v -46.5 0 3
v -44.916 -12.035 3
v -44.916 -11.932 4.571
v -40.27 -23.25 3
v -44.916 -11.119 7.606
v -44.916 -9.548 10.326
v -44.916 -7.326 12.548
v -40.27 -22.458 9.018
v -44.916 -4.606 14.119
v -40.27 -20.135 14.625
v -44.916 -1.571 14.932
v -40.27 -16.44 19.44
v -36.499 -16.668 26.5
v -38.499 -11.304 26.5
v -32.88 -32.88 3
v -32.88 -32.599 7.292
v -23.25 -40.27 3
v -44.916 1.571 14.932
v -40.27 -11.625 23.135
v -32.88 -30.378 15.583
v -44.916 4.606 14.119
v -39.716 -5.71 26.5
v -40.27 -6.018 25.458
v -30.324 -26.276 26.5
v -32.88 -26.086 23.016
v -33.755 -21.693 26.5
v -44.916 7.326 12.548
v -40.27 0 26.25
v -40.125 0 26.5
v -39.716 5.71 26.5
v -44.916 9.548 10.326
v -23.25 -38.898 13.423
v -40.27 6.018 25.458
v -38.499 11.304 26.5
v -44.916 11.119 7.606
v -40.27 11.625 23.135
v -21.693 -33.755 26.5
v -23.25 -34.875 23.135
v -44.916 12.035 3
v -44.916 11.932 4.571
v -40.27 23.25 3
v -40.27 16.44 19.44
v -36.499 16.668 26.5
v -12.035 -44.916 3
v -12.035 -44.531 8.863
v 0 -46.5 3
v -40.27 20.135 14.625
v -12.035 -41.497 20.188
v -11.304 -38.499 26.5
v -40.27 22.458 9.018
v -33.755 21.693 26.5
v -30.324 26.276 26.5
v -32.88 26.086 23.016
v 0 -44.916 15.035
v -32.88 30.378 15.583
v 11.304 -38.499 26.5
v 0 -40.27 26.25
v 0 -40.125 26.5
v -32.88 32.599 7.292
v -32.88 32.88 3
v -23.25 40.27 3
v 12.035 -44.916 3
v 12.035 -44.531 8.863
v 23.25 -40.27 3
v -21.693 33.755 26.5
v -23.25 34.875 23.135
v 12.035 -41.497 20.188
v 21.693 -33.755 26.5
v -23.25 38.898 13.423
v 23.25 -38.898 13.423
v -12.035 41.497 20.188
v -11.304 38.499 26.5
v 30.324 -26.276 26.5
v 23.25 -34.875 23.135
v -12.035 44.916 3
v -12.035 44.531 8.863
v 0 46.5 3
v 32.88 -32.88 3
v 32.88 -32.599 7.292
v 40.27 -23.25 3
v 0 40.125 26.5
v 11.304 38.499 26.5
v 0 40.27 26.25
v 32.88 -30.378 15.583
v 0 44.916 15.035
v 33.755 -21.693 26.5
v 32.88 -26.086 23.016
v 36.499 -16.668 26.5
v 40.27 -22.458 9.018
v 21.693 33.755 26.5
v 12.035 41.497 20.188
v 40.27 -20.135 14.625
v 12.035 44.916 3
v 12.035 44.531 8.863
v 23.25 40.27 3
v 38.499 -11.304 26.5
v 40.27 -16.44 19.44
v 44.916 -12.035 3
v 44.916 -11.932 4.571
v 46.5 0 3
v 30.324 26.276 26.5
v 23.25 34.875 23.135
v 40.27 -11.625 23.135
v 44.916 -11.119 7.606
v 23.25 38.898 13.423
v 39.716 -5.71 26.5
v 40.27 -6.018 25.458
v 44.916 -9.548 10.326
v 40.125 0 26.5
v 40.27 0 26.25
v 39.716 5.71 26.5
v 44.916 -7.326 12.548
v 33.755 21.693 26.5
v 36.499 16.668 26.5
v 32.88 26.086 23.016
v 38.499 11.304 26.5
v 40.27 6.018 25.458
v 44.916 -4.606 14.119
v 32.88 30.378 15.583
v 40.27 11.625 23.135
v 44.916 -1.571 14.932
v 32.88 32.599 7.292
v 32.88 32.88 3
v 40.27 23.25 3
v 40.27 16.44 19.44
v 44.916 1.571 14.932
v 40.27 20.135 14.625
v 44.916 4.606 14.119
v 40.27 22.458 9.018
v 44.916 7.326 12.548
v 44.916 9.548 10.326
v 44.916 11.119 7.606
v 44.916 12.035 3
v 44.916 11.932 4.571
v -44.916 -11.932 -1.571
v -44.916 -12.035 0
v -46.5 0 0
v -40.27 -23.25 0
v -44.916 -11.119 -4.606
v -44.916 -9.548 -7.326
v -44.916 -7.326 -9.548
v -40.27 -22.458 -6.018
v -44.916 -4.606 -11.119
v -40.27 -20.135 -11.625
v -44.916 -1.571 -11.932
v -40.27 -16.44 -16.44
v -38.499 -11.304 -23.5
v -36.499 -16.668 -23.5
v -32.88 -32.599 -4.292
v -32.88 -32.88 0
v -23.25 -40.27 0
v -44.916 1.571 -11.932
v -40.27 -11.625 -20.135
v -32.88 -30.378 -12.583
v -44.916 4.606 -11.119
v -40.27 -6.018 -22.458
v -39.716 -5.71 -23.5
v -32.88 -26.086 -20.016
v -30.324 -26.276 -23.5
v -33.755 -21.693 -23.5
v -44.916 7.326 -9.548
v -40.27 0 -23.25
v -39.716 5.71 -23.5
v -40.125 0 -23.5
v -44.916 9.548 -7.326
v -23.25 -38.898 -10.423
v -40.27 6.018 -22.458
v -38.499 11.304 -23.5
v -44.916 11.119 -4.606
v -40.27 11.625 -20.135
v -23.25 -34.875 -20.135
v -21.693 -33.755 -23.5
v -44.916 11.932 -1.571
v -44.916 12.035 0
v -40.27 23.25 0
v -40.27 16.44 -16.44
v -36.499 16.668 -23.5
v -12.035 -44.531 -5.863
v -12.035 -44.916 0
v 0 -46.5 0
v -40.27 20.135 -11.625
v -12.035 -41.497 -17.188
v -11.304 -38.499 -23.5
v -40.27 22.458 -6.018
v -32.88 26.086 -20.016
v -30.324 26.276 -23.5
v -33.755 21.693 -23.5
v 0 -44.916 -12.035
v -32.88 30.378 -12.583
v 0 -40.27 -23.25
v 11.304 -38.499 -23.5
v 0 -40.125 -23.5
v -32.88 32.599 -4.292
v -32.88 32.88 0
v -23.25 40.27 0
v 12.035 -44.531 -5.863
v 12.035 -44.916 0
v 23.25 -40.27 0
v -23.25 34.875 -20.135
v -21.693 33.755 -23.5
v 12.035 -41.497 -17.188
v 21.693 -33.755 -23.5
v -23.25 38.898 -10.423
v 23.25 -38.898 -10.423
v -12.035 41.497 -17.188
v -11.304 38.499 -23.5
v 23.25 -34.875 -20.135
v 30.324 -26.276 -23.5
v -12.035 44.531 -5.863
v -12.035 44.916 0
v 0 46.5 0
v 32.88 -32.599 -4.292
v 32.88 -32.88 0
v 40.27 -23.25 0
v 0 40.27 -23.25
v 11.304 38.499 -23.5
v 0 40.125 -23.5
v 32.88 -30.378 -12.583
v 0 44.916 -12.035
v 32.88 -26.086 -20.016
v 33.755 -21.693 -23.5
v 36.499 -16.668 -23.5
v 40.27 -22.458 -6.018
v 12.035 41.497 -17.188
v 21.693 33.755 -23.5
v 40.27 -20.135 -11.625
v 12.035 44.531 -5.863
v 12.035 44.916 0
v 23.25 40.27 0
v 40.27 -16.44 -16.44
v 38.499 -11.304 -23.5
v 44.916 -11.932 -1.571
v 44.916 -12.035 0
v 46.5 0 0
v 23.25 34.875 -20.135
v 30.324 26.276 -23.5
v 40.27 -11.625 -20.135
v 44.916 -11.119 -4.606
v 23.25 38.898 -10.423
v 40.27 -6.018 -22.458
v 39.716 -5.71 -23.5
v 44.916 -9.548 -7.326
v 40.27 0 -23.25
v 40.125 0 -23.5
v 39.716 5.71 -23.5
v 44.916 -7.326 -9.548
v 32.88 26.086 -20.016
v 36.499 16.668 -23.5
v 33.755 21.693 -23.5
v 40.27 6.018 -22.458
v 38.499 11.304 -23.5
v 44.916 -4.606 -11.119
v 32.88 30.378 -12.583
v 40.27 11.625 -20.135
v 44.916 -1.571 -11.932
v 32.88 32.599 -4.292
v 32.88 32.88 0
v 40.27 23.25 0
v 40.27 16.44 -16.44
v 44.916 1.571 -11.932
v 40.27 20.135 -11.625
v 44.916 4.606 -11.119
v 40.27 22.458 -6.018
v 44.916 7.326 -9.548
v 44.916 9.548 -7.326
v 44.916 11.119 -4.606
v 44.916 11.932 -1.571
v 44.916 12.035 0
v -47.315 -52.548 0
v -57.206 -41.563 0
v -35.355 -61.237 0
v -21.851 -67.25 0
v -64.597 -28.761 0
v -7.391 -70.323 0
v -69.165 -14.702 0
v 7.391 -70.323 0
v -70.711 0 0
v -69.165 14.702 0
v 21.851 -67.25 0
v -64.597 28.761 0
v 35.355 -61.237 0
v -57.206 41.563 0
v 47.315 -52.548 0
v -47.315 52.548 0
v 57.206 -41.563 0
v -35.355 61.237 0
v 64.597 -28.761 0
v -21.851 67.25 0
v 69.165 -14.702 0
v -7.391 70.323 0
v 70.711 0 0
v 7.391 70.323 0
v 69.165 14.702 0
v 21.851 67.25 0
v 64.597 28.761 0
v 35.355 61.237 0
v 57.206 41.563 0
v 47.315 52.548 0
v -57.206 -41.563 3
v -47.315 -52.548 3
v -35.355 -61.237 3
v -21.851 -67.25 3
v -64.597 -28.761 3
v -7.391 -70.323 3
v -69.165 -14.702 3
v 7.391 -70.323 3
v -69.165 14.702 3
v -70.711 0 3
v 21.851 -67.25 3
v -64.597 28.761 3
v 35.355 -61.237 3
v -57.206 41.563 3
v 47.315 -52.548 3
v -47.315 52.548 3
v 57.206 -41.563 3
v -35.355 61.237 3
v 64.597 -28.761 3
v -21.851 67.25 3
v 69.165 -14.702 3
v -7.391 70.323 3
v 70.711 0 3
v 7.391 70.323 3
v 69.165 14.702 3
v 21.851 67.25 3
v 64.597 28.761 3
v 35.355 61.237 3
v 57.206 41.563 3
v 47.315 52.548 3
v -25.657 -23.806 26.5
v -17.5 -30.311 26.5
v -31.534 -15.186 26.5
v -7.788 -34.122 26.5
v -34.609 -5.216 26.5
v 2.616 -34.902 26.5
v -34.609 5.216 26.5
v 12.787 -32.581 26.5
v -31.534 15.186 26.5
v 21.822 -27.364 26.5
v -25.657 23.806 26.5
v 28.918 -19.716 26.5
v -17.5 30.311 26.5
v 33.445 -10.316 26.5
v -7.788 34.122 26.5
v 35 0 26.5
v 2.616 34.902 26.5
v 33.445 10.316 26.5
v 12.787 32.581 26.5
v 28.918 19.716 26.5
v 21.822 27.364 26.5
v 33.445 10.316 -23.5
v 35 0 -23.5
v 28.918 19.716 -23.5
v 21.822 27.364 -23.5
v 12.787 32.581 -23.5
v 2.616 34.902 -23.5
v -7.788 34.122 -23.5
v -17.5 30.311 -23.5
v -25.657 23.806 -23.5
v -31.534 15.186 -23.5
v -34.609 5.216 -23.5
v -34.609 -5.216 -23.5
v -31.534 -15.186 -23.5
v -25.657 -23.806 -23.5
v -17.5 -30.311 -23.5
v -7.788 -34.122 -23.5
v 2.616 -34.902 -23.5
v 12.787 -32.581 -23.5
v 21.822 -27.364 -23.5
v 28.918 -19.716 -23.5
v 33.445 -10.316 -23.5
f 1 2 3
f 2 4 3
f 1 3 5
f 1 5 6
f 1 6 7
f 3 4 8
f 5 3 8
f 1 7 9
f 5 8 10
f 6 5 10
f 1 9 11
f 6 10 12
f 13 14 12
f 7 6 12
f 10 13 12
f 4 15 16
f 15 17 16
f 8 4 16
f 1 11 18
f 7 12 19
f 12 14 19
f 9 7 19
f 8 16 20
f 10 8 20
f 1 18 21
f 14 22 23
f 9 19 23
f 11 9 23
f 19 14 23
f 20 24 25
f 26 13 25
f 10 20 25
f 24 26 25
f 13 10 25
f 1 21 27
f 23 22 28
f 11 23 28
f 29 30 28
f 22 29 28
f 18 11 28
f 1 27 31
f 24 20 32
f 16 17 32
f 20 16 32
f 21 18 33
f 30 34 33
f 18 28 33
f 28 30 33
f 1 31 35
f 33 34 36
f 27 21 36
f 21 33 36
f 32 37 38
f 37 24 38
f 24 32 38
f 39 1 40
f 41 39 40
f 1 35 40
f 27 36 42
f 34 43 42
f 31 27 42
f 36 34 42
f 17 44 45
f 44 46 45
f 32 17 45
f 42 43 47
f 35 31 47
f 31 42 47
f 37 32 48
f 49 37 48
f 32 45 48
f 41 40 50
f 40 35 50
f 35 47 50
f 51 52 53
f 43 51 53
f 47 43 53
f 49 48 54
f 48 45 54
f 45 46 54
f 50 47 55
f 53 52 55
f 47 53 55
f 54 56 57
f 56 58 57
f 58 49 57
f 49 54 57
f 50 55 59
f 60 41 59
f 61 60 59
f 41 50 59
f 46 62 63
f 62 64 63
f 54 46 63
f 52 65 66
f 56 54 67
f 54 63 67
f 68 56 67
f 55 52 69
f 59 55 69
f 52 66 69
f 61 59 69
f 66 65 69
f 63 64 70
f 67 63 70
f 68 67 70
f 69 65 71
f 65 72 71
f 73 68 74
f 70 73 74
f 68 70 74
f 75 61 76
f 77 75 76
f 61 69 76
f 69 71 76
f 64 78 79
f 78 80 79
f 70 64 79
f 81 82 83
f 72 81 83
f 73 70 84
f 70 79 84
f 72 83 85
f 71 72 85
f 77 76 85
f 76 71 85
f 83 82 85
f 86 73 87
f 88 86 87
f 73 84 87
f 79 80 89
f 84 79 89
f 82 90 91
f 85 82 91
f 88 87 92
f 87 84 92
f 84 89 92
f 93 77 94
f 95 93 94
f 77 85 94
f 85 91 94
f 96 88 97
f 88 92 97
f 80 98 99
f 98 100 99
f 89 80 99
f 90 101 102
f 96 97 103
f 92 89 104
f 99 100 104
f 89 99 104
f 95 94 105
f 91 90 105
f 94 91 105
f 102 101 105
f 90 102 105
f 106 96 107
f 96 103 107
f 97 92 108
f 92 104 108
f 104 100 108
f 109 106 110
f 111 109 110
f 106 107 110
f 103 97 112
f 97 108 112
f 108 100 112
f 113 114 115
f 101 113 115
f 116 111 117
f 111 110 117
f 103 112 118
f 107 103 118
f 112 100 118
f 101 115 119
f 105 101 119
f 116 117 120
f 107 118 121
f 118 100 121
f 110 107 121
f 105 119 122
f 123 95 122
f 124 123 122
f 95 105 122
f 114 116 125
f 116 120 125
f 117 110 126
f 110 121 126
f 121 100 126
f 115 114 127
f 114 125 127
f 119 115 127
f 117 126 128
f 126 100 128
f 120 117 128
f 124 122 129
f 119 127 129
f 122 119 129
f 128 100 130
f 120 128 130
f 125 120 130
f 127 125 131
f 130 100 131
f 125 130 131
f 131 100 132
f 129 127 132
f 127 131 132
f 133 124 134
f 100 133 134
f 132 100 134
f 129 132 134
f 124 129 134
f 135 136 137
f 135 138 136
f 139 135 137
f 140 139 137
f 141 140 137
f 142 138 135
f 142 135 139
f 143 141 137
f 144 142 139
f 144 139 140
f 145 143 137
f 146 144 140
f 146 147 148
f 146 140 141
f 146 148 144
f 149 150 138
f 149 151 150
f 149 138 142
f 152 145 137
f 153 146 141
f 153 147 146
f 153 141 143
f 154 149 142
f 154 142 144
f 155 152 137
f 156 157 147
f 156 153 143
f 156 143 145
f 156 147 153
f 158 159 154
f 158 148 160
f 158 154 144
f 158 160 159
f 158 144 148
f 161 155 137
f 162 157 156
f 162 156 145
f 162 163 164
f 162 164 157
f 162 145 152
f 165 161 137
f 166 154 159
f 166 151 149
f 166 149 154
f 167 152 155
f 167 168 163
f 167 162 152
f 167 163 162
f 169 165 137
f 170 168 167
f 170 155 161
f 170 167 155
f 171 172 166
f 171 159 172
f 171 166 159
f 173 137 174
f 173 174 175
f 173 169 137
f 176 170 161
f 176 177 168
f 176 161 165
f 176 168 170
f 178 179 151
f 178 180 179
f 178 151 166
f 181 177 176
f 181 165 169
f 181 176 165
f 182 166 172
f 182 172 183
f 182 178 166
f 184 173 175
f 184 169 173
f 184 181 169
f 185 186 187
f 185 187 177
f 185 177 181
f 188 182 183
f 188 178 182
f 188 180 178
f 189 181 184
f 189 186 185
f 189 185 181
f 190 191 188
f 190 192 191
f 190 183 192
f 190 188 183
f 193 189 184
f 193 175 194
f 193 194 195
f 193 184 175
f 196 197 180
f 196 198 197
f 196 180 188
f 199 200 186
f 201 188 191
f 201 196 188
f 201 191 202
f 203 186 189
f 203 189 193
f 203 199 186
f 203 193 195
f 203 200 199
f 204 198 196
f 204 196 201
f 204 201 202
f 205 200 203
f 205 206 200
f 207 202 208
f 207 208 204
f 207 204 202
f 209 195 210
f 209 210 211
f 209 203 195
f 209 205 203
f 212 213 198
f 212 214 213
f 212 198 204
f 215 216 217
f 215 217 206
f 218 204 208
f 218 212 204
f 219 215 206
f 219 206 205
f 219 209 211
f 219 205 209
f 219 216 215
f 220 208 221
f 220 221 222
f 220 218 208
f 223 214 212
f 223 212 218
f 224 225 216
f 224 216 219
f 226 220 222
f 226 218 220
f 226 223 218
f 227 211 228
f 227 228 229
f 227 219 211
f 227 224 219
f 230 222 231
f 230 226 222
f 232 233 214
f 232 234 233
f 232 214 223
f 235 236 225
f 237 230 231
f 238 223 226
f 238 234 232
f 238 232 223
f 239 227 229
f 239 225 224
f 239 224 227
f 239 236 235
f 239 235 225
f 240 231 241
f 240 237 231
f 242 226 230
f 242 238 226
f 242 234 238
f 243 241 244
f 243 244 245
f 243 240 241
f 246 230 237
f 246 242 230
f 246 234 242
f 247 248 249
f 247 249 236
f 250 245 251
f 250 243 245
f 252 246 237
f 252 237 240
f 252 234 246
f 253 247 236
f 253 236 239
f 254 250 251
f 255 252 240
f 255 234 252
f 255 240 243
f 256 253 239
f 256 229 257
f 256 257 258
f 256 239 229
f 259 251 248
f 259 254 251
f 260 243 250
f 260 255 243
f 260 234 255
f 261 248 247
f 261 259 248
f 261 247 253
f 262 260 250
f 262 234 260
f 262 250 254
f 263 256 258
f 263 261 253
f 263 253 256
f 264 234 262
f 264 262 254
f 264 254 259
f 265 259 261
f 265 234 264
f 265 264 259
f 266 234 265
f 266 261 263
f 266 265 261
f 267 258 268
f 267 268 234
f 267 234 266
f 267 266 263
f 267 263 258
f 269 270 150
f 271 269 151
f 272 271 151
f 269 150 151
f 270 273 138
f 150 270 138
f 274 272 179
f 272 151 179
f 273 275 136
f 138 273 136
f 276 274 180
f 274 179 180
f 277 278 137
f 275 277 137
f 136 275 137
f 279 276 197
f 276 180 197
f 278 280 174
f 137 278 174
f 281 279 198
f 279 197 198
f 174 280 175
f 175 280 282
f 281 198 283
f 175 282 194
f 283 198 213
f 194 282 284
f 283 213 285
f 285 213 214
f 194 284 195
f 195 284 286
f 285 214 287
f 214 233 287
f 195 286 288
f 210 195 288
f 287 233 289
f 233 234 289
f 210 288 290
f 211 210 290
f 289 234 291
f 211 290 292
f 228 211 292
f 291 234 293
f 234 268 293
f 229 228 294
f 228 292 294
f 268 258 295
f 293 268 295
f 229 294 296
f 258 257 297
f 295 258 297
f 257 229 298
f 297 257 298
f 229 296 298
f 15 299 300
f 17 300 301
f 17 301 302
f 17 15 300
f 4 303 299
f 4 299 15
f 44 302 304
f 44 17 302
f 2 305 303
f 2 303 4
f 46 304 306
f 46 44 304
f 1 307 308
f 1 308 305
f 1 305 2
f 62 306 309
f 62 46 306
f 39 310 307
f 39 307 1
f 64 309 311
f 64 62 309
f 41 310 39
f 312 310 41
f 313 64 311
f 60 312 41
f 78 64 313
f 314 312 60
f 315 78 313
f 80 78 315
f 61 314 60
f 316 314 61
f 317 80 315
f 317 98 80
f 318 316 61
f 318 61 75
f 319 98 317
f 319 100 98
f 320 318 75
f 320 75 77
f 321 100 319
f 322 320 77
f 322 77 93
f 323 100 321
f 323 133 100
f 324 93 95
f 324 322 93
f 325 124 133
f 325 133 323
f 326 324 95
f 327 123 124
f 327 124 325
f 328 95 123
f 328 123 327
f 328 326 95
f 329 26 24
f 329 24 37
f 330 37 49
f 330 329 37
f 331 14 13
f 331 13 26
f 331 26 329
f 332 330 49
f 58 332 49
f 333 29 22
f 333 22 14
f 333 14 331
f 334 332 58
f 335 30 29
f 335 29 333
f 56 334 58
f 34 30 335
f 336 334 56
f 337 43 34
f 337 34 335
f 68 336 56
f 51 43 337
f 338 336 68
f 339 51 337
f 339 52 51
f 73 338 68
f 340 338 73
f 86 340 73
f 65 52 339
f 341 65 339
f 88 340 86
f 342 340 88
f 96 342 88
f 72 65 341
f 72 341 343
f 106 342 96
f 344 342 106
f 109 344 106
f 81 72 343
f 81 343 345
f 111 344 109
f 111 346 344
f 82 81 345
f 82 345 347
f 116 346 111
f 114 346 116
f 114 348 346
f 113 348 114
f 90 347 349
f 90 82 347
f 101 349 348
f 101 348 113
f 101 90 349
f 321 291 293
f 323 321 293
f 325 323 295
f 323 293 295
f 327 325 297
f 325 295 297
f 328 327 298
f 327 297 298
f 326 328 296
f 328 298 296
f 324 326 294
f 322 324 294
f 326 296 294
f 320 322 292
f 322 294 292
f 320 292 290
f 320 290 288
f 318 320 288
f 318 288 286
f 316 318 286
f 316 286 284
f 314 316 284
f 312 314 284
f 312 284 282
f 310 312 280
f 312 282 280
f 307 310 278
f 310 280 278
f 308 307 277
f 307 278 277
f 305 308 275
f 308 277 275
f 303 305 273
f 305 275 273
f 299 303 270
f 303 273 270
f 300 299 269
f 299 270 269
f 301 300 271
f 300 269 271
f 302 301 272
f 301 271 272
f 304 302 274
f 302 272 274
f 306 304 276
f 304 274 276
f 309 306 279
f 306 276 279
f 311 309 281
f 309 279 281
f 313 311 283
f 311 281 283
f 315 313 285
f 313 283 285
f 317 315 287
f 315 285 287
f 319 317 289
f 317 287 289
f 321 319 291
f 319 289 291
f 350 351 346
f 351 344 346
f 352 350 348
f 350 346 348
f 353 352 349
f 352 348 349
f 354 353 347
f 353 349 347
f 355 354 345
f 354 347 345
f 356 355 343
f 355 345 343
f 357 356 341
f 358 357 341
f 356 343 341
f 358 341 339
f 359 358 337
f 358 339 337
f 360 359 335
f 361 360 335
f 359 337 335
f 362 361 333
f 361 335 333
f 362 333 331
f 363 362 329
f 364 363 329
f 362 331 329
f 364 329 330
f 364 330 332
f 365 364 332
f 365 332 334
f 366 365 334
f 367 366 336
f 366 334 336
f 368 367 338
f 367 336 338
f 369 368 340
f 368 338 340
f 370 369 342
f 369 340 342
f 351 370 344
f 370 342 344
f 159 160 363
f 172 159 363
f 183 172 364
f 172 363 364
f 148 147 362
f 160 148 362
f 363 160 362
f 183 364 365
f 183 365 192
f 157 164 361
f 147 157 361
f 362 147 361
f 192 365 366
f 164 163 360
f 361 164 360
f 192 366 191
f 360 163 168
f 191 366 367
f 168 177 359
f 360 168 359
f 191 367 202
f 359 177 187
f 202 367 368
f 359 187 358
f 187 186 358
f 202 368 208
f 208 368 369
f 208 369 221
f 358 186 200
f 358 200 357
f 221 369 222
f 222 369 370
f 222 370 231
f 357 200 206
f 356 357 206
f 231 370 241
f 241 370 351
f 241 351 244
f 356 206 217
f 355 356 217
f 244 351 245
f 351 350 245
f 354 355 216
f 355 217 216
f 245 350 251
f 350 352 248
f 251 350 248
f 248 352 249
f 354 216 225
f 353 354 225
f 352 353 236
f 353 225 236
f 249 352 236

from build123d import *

# Parameters (mm, degrees)
F2_ANGLE       = 180
F1_R           = 70.7106781187
F3_DEPTH       = 3
F5_ANGLE       = 180
F8_W           = 100
F8_H           = 100
F9_DEPTH       = 25
F11_W          = 100
F11_H          = 100
F12_DEPTH      = 25
F13_R          = 35
F14_DEPTH      = 26.501
F14_DEPTH_BACK = 23.501


with BuildPart() as f2:
    # F1 (on Top) → F2 (revolve)
    with BuildSketch(Plane.XY):
        with BuildLine():
            ThreePointArc((-46.5, 0), (0, -46.5), (46.5, 0))
            Line((46.5, 0), (-46.5, 0))
        make_face()
    revolve(axis=Axis((0, 0, 0), (1, 0, 0)), revolution_arc=F2_ANGLE)

    # F1 (on Top) → F3 (join)
    with BuildSketch(Plane.XY):
        Circle(F1_R)
        with BuildLine():
            ThreePointArc((-46.5, 0), (0, 46.5), (46.5, 0))
            ThreePointArc((46.5, 0), (0, -46.5), (-46.5, 0))
        make_face(mode=Mode.SUBTRACT)
        with BuildLine():
            Line((-46.5, 0), (46.5, 0))
            ThreePointArc((46.5, 0), (0, 46.5), (-46.5, 0))
        make_face()
        with BuildLine():
            ThreePointArc((-46.5, 0), (0, -46.5), (46.5, 0))
            Line((46.5, 0), (-46.5, 0))
        make_face()
    extrude(amount=F3_DEPTH)

    # F4 (on face) → F5 (revolve)
    with BuildSketch(Plane.XY.offset(3)):
        with BuildLine():
            Line((46.5, 0), (-46.5, 0))
            ThreePointArc((-46.5, 0), (0, -46.5), (46.5, 0))
        make_face()
    revolve(axis=Axis((0, 0, 3), (-1, 0, 0)), revolution_arc=F5_ANGLE)

    # F8 (on plane+point) → F9 (cut)
    with BuildSketch(Plane.XY.offset(26.5)):
        Rectangle(F8_W, F8_H)
    extrude(amount=F9_DEPTH, mode=Mode.SUBTRACT)

    # F11 (on plane+point) → F12 (cut)
    with BuildSketch(Plane.XY.offset(-23.5)):
        Rectangle(F11_W, F11_H)
    extrude(amount=-F12_DEPTH, mode=Mode.SUBTRACT)

    # F13 (on Top) → F14 (cut, two sides)
    with BuildSketch(Plane.XY) as f14_sk:
        Circle(F13_R)
    extrude(amount=F14_DEPTH, mode=Mode.SUBTRACT)
    extrude(f14_sk.sketch, amount=-F14_DEPTH_BACK, mode=Mode.SUBTRACT)


solid = f2.part
